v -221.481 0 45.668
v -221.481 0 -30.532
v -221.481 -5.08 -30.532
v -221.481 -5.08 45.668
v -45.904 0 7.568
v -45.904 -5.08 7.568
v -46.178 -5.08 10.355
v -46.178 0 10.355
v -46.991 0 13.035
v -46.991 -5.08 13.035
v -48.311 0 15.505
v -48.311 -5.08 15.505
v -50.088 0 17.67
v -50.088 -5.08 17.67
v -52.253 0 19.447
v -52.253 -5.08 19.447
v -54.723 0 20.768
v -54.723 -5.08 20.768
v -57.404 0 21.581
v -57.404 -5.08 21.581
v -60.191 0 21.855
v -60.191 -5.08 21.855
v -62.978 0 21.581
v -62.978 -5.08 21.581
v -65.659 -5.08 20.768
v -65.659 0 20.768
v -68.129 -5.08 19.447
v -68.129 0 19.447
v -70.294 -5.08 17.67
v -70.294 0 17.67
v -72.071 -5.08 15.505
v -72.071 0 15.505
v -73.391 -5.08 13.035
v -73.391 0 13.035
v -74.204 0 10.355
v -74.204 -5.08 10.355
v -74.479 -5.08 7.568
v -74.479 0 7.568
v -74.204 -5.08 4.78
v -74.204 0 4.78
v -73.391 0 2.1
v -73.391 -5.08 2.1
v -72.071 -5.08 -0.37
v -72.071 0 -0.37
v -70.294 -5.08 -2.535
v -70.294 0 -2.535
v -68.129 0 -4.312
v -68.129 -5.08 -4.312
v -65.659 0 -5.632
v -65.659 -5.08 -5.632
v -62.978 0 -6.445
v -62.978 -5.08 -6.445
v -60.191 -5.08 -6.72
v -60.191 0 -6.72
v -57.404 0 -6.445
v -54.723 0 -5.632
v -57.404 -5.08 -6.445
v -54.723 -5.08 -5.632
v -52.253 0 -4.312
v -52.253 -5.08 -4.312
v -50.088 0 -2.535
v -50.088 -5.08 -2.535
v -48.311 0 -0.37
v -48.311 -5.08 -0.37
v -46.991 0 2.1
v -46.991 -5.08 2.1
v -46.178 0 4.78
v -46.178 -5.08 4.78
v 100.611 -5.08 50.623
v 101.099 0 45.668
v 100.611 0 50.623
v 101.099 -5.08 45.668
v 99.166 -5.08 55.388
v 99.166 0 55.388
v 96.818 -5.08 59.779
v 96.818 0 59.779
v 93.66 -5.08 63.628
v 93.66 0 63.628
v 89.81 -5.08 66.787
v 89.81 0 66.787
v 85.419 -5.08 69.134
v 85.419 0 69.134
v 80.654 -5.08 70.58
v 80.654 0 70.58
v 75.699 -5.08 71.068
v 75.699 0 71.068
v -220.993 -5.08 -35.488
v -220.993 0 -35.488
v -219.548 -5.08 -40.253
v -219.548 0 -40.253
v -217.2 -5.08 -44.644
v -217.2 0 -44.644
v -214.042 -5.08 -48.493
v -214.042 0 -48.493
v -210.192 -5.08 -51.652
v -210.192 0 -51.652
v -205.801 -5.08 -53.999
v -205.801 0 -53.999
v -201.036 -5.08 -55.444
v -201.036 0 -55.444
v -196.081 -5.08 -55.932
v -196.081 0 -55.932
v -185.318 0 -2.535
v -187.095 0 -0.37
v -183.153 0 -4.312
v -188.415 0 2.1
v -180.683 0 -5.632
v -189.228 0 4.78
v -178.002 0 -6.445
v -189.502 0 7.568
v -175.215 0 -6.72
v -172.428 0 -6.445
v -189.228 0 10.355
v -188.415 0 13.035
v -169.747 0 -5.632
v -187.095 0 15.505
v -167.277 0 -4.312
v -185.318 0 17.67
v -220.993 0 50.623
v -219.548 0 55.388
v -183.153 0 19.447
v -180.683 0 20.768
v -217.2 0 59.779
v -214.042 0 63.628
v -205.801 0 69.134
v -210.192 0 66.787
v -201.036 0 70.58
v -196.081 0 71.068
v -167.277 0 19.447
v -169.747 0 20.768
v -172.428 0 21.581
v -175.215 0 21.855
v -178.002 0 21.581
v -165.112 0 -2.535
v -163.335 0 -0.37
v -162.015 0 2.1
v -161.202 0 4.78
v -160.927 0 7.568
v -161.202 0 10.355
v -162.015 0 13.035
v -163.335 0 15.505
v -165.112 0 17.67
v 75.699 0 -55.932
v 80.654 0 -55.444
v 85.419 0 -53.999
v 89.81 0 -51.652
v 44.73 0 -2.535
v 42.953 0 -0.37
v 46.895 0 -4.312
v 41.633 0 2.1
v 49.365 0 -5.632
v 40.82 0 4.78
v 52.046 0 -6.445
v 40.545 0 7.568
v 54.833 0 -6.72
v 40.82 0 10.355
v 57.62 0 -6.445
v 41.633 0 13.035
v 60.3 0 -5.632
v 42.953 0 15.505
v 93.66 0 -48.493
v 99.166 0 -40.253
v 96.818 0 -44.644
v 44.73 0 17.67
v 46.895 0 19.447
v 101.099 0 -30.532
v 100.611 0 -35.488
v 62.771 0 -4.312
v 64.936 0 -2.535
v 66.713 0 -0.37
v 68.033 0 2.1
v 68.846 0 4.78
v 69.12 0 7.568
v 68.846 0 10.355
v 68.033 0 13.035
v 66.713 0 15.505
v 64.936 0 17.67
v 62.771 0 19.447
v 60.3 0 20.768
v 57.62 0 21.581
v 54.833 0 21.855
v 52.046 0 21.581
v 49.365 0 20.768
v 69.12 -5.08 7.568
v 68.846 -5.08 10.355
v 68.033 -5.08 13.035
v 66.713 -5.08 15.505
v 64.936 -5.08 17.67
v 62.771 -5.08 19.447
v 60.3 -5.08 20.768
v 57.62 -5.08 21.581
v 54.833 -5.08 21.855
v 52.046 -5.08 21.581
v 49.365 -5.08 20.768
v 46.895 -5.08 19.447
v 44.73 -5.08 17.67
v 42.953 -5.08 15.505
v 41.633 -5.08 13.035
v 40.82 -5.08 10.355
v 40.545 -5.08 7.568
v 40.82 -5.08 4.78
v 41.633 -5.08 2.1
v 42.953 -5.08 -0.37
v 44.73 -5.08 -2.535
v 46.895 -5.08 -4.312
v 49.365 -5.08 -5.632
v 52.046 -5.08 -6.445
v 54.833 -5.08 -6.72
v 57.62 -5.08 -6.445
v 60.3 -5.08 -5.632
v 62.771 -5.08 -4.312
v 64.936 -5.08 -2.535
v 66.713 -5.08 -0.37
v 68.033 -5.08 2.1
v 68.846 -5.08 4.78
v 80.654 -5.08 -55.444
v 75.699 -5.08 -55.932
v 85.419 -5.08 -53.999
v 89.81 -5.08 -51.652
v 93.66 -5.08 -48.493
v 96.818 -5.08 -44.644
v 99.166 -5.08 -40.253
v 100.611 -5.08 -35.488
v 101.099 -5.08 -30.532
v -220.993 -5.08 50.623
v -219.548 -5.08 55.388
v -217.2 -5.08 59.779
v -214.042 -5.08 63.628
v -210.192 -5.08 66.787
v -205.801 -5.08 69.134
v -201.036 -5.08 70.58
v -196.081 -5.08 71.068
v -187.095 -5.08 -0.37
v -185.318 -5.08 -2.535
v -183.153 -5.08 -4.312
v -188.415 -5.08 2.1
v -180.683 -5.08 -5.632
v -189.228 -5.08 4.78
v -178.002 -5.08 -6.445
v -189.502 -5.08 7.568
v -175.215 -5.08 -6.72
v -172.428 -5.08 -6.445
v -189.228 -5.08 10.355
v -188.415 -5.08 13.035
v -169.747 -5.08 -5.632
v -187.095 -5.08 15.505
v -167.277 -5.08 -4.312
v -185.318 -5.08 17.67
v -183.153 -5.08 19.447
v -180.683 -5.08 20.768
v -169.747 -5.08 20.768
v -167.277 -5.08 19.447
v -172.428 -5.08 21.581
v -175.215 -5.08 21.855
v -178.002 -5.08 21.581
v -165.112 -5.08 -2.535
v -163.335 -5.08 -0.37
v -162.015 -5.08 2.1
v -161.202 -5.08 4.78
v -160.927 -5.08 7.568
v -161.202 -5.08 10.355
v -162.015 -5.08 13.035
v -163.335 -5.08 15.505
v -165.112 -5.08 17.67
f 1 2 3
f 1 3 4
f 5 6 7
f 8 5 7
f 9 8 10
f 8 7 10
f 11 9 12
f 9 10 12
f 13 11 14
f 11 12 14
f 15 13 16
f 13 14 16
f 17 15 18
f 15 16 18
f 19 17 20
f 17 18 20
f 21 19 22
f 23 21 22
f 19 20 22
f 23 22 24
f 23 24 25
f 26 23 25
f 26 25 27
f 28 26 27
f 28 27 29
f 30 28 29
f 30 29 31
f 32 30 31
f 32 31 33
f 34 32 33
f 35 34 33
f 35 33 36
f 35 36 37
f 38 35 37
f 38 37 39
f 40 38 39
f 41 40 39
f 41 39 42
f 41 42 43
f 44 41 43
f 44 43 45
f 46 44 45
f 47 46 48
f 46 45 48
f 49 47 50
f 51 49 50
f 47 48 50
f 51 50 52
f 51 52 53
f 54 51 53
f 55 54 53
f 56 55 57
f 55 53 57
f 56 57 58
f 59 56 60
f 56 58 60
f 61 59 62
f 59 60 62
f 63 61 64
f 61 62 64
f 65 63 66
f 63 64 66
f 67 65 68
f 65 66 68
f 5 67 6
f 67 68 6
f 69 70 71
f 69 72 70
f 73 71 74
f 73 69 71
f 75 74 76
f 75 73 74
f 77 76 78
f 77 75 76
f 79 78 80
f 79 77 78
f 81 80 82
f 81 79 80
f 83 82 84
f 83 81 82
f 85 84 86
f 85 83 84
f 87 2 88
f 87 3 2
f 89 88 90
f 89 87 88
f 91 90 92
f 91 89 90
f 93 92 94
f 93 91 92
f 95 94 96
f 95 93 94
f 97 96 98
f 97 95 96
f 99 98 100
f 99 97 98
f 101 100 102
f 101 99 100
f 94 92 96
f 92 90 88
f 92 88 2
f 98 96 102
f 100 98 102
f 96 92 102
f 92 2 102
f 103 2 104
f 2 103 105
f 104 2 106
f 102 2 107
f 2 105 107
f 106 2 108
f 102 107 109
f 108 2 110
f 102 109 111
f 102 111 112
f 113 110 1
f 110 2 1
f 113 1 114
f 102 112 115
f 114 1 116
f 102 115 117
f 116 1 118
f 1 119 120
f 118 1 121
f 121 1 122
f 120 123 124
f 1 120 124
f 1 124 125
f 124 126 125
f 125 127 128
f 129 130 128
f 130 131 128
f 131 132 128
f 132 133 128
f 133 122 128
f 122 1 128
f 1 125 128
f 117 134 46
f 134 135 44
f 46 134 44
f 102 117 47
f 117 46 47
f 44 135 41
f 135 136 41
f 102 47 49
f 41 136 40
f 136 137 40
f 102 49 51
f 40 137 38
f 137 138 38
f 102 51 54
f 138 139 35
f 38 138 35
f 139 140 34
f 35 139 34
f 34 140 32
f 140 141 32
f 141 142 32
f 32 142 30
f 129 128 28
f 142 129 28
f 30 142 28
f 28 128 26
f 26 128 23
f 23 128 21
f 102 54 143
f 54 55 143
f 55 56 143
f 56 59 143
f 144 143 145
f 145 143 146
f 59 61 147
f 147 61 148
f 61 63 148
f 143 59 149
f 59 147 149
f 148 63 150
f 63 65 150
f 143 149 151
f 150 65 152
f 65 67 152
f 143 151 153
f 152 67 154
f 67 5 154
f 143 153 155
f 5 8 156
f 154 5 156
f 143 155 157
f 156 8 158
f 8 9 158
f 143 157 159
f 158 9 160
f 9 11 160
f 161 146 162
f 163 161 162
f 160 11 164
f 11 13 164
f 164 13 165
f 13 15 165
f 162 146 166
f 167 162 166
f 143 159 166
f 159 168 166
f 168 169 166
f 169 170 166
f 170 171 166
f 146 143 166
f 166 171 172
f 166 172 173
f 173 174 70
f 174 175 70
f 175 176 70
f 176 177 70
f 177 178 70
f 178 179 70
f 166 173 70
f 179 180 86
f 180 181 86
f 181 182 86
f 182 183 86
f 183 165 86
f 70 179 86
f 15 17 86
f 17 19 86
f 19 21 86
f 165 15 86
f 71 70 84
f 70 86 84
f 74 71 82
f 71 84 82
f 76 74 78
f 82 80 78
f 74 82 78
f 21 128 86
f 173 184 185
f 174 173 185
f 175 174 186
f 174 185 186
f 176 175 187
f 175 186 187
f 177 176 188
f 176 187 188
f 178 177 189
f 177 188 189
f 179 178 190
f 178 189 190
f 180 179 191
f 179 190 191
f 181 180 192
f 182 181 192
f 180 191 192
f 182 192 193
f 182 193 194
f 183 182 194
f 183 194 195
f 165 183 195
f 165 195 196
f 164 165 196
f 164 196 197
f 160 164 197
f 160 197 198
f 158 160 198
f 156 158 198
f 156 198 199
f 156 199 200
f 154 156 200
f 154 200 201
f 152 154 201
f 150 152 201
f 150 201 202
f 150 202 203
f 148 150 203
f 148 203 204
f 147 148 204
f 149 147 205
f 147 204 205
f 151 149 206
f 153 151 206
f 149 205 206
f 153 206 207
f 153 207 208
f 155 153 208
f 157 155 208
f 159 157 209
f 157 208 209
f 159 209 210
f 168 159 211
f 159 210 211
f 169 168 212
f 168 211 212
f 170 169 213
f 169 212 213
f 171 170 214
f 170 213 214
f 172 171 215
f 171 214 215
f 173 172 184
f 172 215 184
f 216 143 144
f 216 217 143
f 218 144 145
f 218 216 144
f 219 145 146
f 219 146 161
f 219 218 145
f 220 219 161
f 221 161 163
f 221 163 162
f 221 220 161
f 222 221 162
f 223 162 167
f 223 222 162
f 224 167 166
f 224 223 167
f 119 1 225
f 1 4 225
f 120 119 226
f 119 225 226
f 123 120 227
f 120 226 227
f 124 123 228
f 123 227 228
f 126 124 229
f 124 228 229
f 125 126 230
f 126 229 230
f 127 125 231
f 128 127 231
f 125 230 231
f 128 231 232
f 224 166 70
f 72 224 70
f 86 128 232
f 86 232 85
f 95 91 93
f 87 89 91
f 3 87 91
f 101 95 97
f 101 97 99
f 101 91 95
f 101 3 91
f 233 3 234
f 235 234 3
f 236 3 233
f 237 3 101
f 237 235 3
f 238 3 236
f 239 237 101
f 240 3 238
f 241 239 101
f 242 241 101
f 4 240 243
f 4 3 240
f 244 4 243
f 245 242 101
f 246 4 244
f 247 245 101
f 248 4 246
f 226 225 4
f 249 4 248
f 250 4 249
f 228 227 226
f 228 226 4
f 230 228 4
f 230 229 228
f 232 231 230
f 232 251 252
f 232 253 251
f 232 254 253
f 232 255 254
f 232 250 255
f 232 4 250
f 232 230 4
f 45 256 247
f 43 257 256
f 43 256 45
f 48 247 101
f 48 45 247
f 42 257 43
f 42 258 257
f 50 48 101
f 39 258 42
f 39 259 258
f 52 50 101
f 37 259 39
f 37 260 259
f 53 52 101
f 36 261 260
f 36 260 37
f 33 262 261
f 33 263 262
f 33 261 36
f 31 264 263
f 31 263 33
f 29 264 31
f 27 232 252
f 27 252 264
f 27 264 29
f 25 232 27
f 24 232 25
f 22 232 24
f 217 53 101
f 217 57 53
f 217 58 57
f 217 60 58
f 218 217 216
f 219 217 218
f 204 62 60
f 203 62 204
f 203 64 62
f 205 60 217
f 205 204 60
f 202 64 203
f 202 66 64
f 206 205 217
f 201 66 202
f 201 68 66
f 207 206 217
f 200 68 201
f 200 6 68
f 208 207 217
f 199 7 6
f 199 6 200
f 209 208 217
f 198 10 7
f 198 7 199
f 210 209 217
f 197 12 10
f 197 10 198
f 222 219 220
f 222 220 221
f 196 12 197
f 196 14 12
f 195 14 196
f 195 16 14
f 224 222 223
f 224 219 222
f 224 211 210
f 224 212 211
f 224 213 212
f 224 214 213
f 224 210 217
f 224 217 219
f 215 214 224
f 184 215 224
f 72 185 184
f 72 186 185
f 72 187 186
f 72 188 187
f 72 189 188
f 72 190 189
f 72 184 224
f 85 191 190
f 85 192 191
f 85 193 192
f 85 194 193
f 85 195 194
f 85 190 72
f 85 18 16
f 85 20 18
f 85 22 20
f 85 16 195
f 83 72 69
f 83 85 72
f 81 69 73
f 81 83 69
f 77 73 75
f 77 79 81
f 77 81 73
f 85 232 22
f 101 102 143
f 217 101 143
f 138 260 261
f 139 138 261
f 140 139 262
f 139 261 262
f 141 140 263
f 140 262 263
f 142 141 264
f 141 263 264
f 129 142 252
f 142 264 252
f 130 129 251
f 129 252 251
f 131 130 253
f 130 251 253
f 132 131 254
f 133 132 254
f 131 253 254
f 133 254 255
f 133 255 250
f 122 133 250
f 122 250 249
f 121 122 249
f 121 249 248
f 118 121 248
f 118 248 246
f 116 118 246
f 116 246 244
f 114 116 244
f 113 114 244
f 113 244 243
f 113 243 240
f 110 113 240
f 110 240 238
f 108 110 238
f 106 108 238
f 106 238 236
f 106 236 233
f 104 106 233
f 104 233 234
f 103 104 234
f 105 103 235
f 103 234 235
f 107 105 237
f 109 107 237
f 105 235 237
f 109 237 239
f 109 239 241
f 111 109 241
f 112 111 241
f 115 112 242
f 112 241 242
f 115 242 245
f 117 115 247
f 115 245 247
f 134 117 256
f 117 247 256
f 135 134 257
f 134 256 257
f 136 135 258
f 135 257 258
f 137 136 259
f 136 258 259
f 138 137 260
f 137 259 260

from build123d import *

# Parameters (mm, degrees)
F0_W     = 322.58
F0_H     = 127
F1_DEPTH = 5.08
F2_R     = 25.4
F3_R     = 14.2875
F4_DEPTH = 25.4


with BuildPart() as f1:
    # F0 (on Front) → F1 (new body)
    with BuildSketch(Plane.XZ):
        with Locations((-60.191011, 7.567608)):
            Rectangle(F0_W, F0_H)
    extrude(amount=F1_DEPTH)

    # F2
    f2_edges = [f1.edges().sort_by_distance(p)[0] for p in [
        (101.098989, -2.54, 71.067608),
        (101.098989, -2.54, -55.932392),
        (-221.481011, -2.54, 71.067608),
        (-221.481011, -2.54, -55.932392),
    ]]
    fillet(f2_edges, radius=F2_R)

    # F3 (on face) → F4 (cut)
    with BuildSketch(Plane.XZ.offset(5.08)):
        with Locations((-60.191011, 7.567608)):
            Circle(F3_R)
        with Locations((54.832889, 7.567608)):
            Circle(F3_R)
        with Locations((-175.214911, 7.567608)):
            Circle(F3_R)
    extrude(amount=-F4_DEPTH, mode=Mode.SUBTRACT)


solid = f1.part
